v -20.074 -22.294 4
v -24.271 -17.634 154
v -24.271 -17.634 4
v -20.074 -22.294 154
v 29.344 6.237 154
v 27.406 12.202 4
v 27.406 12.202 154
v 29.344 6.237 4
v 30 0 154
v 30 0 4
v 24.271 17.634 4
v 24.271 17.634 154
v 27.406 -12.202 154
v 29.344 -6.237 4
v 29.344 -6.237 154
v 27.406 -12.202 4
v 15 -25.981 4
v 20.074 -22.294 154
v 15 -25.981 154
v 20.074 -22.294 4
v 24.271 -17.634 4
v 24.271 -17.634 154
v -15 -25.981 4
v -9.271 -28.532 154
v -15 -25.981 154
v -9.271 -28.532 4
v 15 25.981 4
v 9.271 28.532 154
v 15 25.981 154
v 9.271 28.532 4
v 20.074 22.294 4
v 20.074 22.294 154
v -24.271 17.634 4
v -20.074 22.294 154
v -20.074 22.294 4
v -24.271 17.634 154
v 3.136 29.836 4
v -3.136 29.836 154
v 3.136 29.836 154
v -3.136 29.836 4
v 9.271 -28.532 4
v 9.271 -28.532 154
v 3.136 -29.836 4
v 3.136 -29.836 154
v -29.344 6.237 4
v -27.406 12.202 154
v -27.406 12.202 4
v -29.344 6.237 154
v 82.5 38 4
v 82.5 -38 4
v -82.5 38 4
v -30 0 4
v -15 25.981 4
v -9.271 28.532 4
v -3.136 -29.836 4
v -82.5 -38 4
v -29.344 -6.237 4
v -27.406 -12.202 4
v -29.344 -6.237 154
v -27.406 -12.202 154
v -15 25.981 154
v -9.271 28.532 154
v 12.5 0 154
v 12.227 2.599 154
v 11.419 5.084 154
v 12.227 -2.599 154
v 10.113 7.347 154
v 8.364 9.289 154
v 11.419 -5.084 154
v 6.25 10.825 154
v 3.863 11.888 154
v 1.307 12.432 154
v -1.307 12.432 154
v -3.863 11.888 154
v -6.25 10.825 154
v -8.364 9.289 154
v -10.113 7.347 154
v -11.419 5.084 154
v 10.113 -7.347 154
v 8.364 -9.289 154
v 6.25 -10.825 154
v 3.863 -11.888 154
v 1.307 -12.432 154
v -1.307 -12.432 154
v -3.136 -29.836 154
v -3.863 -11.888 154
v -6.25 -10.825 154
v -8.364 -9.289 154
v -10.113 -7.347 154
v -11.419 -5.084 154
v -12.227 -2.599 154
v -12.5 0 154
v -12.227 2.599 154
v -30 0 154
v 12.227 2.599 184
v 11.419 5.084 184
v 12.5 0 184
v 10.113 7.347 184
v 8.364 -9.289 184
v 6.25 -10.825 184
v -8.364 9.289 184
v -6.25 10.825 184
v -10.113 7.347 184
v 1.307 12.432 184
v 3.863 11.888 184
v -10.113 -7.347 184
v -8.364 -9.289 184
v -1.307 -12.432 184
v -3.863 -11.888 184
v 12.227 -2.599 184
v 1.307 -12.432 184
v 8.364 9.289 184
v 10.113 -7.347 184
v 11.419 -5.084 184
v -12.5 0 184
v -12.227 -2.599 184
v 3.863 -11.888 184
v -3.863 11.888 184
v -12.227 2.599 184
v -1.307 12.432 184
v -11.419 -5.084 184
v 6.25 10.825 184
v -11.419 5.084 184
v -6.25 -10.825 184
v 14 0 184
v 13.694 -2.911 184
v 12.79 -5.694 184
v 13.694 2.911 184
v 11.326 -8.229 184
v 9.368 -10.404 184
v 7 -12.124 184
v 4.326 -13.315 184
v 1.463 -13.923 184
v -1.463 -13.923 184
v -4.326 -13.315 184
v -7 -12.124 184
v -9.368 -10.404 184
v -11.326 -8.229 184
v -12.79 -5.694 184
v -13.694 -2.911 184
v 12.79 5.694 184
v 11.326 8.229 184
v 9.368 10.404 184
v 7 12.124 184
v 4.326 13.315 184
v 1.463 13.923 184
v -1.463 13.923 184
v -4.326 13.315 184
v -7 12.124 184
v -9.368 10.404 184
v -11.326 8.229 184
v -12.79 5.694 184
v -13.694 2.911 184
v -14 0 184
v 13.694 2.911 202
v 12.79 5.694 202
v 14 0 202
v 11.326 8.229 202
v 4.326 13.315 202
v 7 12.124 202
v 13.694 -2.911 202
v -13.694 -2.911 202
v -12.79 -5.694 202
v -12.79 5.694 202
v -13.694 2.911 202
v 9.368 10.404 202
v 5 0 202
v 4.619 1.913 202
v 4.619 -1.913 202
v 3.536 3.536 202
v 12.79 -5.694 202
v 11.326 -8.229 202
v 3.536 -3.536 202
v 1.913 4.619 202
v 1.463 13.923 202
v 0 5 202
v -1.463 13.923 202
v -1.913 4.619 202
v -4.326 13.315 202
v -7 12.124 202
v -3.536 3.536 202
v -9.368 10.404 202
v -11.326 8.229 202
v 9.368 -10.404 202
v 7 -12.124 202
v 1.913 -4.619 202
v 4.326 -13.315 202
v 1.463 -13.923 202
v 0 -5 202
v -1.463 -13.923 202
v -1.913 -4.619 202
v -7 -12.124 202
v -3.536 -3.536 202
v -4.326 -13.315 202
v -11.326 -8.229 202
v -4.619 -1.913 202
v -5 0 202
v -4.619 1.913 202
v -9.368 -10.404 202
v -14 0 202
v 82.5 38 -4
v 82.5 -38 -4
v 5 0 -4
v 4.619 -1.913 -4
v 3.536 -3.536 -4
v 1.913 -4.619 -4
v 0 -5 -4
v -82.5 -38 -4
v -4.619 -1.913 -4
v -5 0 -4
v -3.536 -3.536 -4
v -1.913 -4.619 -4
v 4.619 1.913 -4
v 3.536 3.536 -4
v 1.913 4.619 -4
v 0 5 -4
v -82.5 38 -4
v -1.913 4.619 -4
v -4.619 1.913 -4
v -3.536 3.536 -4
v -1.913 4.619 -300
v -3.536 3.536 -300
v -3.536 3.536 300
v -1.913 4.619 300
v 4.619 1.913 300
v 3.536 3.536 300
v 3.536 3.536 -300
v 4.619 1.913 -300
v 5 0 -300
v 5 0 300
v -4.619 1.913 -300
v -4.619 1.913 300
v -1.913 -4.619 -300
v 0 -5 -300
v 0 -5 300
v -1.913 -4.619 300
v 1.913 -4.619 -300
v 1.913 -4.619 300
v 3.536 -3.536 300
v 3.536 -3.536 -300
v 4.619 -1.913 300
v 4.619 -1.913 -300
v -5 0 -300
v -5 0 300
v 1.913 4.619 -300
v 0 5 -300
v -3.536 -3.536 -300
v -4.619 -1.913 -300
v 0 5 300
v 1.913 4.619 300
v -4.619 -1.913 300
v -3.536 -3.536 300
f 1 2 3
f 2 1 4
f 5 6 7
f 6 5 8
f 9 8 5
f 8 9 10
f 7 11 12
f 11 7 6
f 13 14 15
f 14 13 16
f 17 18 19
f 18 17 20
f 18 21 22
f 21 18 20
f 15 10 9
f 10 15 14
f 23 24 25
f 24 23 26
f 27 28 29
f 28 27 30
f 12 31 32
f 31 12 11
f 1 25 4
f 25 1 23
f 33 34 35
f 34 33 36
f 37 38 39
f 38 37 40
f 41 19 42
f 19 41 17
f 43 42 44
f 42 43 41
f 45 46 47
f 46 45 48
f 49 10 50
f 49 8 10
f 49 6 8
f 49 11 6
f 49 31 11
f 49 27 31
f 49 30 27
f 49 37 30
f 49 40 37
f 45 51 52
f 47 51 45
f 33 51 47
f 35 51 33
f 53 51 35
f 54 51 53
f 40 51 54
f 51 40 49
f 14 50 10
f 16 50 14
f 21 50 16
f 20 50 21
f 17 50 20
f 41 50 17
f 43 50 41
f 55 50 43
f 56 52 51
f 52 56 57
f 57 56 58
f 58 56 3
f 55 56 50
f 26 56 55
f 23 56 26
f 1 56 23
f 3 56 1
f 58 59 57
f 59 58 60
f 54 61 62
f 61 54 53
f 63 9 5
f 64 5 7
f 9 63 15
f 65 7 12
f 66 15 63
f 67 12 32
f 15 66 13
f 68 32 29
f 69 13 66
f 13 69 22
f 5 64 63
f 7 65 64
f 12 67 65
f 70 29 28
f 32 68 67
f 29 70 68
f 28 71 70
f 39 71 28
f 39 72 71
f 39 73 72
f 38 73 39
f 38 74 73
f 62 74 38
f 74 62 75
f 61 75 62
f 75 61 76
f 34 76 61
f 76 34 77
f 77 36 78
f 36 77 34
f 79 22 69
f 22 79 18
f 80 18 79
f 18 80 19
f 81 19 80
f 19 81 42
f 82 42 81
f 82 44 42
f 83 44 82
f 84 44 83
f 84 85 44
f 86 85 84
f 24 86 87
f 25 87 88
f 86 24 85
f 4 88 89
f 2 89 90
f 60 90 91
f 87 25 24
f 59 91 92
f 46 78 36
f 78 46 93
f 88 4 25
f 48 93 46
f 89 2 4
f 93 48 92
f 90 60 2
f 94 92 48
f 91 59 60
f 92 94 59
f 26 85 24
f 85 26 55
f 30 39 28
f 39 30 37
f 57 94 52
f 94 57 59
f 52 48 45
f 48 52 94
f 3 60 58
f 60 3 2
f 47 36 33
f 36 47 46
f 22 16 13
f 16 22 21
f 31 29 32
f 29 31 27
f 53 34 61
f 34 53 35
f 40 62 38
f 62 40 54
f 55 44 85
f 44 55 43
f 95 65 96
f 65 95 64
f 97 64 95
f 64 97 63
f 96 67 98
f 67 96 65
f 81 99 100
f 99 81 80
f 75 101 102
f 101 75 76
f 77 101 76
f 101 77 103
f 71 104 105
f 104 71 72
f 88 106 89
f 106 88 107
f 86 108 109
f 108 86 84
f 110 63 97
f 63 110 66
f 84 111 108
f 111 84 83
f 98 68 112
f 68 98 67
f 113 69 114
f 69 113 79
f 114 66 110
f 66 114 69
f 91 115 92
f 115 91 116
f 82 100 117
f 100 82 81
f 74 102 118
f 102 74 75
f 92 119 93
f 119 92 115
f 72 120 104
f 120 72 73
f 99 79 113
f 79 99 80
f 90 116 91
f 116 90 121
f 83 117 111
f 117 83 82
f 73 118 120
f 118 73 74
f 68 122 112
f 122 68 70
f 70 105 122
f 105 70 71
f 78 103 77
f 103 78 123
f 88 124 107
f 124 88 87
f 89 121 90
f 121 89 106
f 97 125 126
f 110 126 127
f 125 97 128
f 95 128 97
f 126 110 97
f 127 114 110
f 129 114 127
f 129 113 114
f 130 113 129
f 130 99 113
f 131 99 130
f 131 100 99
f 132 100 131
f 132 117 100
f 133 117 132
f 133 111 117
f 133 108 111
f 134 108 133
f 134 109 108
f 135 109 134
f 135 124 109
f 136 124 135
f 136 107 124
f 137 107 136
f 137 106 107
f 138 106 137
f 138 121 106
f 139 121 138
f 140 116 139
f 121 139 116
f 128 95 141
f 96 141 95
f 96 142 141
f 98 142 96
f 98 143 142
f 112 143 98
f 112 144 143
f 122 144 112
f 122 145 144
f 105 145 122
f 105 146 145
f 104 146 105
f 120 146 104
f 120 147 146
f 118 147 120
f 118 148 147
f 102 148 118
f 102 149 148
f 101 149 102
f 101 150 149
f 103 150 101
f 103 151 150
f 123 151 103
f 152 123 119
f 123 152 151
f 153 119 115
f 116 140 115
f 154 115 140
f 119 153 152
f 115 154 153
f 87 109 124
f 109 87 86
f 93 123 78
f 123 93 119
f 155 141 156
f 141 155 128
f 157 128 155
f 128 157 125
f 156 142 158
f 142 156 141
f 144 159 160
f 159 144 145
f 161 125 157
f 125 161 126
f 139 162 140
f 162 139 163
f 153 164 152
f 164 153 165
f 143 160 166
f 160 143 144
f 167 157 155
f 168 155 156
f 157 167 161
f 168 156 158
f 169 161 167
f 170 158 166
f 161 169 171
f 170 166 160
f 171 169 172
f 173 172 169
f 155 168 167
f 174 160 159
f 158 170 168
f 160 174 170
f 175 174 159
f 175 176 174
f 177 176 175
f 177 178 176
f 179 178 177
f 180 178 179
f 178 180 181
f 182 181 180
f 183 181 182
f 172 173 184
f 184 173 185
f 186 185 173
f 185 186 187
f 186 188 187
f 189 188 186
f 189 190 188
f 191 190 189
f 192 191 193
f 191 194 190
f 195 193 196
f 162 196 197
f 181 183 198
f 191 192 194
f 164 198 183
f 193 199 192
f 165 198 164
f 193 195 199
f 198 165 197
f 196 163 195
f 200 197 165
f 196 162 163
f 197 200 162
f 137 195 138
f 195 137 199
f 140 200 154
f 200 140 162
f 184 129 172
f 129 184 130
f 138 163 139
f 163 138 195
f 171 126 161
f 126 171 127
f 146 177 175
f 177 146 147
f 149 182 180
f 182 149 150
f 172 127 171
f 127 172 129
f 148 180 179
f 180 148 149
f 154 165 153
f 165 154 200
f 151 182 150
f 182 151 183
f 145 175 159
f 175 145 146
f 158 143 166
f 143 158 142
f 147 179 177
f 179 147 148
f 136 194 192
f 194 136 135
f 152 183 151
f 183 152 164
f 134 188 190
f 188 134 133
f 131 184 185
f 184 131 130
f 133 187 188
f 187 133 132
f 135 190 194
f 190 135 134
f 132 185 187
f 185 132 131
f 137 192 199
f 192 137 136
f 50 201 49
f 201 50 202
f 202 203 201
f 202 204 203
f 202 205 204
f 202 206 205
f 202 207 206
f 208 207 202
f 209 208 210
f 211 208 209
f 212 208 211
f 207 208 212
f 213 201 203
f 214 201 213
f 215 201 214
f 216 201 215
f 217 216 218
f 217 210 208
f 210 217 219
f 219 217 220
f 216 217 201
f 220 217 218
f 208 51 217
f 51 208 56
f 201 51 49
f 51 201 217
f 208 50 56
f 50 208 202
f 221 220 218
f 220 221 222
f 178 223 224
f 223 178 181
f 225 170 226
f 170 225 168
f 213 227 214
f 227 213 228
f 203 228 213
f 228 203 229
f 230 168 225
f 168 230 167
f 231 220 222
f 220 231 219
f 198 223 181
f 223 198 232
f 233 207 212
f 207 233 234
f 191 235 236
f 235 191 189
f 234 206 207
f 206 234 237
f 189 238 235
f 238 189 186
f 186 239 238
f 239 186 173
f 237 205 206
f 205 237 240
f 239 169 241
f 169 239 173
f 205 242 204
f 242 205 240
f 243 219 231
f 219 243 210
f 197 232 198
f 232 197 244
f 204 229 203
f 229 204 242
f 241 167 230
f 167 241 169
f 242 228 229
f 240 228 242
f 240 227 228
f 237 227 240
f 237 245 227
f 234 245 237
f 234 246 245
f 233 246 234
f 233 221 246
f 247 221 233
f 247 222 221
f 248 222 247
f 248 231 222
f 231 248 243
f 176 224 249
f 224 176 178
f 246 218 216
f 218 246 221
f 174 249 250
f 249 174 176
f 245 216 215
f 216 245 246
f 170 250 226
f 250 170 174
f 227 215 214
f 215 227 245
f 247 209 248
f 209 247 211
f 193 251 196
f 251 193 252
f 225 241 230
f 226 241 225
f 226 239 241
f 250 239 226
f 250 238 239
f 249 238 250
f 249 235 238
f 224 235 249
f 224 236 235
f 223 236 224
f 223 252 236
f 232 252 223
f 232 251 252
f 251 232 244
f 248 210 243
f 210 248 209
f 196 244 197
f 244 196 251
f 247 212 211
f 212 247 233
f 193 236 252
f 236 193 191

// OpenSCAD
// 165.8 x 76.7 x 8.8 mm
module movil() {
  cube([165,76,8], true);
}

// 150, 60

// 30, 25

module botella() {
    // Este cilindro es la base de la botella
    cylinder(150, 30, 30, true);
  
    // Trasladamos el cilindro en el eje Z
    // La mitad de lo que mide la botella (75)
    // más la mitad de lo que mide el cuello (15)
    translate([0, 0, 75 + 15]) {
        cylinder(30, 12.5, 12.5, true);
    }
    
    translate([0, 0, 75 + 30 + 9]) {
        cylinder(18, 14, 14, true);
    }
}

module forat() {
    cylinder(600, 5, 5, true);
}


module body() {
    movil();
    translate([0,0,75 + 4]) {   
        botella();    
    }
}

body();
forat();
